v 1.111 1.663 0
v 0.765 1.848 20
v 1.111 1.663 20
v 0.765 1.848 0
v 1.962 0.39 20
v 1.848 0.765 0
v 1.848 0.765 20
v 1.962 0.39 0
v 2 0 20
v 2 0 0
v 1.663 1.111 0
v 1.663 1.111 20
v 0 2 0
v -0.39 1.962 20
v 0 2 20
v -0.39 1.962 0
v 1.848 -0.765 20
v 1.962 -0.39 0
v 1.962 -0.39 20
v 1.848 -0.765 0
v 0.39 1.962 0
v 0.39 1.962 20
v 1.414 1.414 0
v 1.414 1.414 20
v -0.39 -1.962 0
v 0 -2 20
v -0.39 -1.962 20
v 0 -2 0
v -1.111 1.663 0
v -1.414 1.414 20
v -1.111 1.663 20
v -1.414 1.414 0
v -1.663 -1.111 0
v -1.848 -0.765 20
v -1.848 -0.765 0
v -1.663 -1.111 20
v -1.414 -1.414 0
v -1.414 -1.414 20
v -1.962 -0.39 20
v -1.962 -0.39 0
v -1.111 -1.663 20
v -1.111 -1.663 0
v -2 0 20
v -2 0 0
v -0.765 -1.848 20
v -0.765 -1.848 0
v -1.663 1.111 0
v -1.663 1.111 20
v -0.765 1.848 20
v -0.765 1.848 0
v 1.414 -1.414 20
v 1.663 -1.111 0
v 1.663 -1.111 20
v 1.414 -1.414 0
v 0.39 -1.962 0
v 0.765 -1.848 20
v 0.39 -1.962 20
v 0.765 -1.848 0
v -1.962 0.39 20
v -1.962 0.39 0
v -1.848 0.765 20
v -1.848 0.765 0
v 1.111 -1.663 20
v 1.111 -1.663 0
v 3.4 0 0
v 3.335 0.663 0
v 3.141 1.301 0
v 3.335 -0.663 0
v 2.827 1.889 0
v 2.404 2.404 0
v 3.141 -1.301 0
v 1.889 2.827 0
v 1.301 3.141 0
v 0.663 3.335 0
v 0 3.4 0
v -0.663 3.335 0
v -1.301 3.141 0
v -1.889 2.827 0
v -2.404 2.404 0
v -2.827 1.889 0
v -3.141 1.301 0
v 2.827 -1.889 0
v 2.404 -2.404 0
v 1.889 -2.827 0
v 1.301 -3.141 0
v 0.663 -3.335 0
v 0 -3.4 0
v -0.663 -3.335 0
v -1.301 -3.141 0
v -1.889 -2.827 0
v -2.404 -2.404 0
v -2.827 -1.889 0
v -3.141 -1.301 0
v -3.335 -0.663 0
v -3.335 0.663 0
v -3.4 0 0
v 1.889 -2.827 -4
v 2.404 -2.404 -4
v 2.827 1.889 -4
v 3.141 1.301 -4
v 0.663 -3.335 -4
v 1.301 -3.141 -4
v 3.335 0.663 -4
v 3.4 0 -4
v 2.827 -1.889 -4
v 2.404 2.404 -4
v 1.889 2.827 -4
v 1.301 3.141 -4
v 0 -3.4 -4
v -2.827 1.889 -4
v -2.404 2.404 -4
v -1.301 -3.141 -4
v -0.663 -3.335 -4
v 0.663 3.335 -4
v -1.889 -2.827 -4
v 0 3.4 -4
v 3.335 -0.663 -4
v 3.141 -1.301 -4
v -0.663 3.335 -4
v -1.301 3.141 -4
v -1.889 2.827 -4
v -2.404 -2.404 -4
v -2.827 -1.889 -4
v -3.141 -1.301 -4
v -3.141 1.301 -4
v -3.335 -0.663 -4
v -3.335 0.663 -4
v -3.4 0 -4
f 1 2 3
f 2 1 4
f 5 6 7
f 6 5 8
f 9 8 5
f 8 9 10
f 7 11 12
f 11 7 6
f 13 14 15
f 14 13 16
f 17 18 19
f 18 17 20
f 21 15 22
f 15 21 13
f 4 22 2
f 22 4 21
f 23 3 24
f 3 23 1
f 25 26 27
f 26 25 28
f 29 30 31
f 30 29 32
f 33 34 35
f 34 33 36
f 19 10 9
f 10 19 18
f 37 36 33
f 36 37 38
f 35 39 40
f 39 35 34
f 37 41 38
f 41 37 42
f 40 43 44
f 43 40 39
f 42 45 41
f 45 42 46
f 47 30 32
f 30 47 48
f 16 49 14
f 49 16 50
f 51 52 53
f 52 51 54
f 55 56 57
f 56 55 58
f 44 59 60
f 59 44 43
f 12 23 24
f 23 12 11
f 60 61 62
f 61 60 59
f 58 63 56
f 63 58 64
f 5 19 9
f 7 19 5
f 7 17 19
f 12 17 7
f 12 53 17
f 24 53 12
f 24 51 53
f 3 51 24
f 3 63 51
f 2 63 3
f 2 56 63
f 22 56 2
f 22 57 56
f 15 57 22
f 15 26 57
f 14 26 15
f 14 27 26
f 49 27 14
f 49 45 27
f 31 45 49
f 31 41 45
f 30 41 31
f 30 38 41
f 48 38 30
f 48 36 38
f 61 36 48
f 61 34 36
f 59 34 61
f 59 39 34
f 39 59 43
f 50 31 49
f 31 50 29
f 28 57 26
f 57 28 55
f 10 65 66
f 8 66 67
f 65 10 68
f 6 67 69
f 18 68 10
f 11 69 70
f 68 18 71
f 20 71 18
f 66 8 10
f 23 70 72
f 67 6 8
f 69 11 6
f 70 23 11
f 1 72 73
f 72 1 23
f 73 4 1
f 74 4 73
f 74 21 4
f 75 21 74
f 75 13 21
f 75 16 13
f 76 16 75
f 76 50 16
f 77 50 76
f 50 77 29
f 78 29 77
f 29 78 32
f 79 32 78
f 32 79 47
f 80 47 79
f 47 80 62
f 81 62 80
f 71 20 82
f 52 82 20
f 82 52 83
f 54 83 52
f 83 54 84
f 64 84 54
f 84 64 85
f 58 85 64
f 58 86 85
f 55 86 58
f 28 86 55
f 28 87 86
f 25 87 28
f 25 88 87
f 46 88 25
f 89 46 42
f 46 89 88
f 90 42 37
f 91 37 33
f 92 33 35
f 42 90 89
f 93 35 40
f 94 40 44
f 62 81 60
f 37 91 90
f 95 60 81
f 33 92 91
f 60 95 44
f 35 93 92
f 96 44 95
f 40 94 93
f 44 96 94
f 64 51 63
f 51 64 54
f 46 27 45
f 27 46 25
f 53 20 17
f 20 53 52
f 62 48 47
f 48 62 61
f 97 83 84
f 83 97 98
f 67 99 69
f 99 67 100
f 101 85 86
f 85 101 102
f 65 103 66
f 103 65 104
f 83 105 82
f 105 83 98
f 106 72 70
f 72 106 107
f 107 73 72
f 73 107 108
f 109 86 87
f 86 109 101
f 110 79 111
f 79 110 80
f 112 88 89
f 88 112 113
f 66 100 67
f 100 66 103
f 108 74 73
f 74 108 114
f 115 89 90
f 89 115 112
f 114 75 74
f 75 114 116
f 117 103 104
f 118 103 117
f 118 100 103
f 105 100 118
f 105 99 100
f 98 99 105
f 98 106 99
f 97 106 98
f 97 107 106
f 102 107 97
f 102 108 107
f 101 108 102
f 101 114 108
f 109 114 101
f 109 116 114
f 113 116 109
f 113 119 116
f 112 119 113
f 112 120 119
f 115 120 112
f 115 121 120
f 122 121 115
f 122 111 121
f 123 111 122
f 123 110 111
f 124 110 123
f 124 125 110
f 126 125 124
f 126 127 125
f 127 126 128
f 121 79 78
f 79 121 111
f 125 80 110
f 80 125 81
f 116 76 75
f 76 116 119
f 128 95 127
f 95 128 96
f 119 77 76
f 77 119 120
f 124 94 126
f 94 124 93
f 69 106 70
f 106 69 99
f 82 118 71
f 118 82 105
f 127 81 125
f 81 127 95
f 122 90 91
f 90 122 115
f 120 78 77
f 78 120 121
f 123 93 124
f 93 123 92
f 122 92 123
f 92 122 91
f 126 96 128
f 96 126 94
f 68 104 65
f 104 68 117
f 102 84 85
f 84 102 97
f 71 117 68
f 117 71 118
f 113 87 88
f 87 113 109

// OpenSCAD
// Purchased hardware envelope; no modeled threads, not print.
$fn=32;
union(){cylinder(d=4,h=20);translate([0,0,-4])cylinder(d=6.8,h=4);}
